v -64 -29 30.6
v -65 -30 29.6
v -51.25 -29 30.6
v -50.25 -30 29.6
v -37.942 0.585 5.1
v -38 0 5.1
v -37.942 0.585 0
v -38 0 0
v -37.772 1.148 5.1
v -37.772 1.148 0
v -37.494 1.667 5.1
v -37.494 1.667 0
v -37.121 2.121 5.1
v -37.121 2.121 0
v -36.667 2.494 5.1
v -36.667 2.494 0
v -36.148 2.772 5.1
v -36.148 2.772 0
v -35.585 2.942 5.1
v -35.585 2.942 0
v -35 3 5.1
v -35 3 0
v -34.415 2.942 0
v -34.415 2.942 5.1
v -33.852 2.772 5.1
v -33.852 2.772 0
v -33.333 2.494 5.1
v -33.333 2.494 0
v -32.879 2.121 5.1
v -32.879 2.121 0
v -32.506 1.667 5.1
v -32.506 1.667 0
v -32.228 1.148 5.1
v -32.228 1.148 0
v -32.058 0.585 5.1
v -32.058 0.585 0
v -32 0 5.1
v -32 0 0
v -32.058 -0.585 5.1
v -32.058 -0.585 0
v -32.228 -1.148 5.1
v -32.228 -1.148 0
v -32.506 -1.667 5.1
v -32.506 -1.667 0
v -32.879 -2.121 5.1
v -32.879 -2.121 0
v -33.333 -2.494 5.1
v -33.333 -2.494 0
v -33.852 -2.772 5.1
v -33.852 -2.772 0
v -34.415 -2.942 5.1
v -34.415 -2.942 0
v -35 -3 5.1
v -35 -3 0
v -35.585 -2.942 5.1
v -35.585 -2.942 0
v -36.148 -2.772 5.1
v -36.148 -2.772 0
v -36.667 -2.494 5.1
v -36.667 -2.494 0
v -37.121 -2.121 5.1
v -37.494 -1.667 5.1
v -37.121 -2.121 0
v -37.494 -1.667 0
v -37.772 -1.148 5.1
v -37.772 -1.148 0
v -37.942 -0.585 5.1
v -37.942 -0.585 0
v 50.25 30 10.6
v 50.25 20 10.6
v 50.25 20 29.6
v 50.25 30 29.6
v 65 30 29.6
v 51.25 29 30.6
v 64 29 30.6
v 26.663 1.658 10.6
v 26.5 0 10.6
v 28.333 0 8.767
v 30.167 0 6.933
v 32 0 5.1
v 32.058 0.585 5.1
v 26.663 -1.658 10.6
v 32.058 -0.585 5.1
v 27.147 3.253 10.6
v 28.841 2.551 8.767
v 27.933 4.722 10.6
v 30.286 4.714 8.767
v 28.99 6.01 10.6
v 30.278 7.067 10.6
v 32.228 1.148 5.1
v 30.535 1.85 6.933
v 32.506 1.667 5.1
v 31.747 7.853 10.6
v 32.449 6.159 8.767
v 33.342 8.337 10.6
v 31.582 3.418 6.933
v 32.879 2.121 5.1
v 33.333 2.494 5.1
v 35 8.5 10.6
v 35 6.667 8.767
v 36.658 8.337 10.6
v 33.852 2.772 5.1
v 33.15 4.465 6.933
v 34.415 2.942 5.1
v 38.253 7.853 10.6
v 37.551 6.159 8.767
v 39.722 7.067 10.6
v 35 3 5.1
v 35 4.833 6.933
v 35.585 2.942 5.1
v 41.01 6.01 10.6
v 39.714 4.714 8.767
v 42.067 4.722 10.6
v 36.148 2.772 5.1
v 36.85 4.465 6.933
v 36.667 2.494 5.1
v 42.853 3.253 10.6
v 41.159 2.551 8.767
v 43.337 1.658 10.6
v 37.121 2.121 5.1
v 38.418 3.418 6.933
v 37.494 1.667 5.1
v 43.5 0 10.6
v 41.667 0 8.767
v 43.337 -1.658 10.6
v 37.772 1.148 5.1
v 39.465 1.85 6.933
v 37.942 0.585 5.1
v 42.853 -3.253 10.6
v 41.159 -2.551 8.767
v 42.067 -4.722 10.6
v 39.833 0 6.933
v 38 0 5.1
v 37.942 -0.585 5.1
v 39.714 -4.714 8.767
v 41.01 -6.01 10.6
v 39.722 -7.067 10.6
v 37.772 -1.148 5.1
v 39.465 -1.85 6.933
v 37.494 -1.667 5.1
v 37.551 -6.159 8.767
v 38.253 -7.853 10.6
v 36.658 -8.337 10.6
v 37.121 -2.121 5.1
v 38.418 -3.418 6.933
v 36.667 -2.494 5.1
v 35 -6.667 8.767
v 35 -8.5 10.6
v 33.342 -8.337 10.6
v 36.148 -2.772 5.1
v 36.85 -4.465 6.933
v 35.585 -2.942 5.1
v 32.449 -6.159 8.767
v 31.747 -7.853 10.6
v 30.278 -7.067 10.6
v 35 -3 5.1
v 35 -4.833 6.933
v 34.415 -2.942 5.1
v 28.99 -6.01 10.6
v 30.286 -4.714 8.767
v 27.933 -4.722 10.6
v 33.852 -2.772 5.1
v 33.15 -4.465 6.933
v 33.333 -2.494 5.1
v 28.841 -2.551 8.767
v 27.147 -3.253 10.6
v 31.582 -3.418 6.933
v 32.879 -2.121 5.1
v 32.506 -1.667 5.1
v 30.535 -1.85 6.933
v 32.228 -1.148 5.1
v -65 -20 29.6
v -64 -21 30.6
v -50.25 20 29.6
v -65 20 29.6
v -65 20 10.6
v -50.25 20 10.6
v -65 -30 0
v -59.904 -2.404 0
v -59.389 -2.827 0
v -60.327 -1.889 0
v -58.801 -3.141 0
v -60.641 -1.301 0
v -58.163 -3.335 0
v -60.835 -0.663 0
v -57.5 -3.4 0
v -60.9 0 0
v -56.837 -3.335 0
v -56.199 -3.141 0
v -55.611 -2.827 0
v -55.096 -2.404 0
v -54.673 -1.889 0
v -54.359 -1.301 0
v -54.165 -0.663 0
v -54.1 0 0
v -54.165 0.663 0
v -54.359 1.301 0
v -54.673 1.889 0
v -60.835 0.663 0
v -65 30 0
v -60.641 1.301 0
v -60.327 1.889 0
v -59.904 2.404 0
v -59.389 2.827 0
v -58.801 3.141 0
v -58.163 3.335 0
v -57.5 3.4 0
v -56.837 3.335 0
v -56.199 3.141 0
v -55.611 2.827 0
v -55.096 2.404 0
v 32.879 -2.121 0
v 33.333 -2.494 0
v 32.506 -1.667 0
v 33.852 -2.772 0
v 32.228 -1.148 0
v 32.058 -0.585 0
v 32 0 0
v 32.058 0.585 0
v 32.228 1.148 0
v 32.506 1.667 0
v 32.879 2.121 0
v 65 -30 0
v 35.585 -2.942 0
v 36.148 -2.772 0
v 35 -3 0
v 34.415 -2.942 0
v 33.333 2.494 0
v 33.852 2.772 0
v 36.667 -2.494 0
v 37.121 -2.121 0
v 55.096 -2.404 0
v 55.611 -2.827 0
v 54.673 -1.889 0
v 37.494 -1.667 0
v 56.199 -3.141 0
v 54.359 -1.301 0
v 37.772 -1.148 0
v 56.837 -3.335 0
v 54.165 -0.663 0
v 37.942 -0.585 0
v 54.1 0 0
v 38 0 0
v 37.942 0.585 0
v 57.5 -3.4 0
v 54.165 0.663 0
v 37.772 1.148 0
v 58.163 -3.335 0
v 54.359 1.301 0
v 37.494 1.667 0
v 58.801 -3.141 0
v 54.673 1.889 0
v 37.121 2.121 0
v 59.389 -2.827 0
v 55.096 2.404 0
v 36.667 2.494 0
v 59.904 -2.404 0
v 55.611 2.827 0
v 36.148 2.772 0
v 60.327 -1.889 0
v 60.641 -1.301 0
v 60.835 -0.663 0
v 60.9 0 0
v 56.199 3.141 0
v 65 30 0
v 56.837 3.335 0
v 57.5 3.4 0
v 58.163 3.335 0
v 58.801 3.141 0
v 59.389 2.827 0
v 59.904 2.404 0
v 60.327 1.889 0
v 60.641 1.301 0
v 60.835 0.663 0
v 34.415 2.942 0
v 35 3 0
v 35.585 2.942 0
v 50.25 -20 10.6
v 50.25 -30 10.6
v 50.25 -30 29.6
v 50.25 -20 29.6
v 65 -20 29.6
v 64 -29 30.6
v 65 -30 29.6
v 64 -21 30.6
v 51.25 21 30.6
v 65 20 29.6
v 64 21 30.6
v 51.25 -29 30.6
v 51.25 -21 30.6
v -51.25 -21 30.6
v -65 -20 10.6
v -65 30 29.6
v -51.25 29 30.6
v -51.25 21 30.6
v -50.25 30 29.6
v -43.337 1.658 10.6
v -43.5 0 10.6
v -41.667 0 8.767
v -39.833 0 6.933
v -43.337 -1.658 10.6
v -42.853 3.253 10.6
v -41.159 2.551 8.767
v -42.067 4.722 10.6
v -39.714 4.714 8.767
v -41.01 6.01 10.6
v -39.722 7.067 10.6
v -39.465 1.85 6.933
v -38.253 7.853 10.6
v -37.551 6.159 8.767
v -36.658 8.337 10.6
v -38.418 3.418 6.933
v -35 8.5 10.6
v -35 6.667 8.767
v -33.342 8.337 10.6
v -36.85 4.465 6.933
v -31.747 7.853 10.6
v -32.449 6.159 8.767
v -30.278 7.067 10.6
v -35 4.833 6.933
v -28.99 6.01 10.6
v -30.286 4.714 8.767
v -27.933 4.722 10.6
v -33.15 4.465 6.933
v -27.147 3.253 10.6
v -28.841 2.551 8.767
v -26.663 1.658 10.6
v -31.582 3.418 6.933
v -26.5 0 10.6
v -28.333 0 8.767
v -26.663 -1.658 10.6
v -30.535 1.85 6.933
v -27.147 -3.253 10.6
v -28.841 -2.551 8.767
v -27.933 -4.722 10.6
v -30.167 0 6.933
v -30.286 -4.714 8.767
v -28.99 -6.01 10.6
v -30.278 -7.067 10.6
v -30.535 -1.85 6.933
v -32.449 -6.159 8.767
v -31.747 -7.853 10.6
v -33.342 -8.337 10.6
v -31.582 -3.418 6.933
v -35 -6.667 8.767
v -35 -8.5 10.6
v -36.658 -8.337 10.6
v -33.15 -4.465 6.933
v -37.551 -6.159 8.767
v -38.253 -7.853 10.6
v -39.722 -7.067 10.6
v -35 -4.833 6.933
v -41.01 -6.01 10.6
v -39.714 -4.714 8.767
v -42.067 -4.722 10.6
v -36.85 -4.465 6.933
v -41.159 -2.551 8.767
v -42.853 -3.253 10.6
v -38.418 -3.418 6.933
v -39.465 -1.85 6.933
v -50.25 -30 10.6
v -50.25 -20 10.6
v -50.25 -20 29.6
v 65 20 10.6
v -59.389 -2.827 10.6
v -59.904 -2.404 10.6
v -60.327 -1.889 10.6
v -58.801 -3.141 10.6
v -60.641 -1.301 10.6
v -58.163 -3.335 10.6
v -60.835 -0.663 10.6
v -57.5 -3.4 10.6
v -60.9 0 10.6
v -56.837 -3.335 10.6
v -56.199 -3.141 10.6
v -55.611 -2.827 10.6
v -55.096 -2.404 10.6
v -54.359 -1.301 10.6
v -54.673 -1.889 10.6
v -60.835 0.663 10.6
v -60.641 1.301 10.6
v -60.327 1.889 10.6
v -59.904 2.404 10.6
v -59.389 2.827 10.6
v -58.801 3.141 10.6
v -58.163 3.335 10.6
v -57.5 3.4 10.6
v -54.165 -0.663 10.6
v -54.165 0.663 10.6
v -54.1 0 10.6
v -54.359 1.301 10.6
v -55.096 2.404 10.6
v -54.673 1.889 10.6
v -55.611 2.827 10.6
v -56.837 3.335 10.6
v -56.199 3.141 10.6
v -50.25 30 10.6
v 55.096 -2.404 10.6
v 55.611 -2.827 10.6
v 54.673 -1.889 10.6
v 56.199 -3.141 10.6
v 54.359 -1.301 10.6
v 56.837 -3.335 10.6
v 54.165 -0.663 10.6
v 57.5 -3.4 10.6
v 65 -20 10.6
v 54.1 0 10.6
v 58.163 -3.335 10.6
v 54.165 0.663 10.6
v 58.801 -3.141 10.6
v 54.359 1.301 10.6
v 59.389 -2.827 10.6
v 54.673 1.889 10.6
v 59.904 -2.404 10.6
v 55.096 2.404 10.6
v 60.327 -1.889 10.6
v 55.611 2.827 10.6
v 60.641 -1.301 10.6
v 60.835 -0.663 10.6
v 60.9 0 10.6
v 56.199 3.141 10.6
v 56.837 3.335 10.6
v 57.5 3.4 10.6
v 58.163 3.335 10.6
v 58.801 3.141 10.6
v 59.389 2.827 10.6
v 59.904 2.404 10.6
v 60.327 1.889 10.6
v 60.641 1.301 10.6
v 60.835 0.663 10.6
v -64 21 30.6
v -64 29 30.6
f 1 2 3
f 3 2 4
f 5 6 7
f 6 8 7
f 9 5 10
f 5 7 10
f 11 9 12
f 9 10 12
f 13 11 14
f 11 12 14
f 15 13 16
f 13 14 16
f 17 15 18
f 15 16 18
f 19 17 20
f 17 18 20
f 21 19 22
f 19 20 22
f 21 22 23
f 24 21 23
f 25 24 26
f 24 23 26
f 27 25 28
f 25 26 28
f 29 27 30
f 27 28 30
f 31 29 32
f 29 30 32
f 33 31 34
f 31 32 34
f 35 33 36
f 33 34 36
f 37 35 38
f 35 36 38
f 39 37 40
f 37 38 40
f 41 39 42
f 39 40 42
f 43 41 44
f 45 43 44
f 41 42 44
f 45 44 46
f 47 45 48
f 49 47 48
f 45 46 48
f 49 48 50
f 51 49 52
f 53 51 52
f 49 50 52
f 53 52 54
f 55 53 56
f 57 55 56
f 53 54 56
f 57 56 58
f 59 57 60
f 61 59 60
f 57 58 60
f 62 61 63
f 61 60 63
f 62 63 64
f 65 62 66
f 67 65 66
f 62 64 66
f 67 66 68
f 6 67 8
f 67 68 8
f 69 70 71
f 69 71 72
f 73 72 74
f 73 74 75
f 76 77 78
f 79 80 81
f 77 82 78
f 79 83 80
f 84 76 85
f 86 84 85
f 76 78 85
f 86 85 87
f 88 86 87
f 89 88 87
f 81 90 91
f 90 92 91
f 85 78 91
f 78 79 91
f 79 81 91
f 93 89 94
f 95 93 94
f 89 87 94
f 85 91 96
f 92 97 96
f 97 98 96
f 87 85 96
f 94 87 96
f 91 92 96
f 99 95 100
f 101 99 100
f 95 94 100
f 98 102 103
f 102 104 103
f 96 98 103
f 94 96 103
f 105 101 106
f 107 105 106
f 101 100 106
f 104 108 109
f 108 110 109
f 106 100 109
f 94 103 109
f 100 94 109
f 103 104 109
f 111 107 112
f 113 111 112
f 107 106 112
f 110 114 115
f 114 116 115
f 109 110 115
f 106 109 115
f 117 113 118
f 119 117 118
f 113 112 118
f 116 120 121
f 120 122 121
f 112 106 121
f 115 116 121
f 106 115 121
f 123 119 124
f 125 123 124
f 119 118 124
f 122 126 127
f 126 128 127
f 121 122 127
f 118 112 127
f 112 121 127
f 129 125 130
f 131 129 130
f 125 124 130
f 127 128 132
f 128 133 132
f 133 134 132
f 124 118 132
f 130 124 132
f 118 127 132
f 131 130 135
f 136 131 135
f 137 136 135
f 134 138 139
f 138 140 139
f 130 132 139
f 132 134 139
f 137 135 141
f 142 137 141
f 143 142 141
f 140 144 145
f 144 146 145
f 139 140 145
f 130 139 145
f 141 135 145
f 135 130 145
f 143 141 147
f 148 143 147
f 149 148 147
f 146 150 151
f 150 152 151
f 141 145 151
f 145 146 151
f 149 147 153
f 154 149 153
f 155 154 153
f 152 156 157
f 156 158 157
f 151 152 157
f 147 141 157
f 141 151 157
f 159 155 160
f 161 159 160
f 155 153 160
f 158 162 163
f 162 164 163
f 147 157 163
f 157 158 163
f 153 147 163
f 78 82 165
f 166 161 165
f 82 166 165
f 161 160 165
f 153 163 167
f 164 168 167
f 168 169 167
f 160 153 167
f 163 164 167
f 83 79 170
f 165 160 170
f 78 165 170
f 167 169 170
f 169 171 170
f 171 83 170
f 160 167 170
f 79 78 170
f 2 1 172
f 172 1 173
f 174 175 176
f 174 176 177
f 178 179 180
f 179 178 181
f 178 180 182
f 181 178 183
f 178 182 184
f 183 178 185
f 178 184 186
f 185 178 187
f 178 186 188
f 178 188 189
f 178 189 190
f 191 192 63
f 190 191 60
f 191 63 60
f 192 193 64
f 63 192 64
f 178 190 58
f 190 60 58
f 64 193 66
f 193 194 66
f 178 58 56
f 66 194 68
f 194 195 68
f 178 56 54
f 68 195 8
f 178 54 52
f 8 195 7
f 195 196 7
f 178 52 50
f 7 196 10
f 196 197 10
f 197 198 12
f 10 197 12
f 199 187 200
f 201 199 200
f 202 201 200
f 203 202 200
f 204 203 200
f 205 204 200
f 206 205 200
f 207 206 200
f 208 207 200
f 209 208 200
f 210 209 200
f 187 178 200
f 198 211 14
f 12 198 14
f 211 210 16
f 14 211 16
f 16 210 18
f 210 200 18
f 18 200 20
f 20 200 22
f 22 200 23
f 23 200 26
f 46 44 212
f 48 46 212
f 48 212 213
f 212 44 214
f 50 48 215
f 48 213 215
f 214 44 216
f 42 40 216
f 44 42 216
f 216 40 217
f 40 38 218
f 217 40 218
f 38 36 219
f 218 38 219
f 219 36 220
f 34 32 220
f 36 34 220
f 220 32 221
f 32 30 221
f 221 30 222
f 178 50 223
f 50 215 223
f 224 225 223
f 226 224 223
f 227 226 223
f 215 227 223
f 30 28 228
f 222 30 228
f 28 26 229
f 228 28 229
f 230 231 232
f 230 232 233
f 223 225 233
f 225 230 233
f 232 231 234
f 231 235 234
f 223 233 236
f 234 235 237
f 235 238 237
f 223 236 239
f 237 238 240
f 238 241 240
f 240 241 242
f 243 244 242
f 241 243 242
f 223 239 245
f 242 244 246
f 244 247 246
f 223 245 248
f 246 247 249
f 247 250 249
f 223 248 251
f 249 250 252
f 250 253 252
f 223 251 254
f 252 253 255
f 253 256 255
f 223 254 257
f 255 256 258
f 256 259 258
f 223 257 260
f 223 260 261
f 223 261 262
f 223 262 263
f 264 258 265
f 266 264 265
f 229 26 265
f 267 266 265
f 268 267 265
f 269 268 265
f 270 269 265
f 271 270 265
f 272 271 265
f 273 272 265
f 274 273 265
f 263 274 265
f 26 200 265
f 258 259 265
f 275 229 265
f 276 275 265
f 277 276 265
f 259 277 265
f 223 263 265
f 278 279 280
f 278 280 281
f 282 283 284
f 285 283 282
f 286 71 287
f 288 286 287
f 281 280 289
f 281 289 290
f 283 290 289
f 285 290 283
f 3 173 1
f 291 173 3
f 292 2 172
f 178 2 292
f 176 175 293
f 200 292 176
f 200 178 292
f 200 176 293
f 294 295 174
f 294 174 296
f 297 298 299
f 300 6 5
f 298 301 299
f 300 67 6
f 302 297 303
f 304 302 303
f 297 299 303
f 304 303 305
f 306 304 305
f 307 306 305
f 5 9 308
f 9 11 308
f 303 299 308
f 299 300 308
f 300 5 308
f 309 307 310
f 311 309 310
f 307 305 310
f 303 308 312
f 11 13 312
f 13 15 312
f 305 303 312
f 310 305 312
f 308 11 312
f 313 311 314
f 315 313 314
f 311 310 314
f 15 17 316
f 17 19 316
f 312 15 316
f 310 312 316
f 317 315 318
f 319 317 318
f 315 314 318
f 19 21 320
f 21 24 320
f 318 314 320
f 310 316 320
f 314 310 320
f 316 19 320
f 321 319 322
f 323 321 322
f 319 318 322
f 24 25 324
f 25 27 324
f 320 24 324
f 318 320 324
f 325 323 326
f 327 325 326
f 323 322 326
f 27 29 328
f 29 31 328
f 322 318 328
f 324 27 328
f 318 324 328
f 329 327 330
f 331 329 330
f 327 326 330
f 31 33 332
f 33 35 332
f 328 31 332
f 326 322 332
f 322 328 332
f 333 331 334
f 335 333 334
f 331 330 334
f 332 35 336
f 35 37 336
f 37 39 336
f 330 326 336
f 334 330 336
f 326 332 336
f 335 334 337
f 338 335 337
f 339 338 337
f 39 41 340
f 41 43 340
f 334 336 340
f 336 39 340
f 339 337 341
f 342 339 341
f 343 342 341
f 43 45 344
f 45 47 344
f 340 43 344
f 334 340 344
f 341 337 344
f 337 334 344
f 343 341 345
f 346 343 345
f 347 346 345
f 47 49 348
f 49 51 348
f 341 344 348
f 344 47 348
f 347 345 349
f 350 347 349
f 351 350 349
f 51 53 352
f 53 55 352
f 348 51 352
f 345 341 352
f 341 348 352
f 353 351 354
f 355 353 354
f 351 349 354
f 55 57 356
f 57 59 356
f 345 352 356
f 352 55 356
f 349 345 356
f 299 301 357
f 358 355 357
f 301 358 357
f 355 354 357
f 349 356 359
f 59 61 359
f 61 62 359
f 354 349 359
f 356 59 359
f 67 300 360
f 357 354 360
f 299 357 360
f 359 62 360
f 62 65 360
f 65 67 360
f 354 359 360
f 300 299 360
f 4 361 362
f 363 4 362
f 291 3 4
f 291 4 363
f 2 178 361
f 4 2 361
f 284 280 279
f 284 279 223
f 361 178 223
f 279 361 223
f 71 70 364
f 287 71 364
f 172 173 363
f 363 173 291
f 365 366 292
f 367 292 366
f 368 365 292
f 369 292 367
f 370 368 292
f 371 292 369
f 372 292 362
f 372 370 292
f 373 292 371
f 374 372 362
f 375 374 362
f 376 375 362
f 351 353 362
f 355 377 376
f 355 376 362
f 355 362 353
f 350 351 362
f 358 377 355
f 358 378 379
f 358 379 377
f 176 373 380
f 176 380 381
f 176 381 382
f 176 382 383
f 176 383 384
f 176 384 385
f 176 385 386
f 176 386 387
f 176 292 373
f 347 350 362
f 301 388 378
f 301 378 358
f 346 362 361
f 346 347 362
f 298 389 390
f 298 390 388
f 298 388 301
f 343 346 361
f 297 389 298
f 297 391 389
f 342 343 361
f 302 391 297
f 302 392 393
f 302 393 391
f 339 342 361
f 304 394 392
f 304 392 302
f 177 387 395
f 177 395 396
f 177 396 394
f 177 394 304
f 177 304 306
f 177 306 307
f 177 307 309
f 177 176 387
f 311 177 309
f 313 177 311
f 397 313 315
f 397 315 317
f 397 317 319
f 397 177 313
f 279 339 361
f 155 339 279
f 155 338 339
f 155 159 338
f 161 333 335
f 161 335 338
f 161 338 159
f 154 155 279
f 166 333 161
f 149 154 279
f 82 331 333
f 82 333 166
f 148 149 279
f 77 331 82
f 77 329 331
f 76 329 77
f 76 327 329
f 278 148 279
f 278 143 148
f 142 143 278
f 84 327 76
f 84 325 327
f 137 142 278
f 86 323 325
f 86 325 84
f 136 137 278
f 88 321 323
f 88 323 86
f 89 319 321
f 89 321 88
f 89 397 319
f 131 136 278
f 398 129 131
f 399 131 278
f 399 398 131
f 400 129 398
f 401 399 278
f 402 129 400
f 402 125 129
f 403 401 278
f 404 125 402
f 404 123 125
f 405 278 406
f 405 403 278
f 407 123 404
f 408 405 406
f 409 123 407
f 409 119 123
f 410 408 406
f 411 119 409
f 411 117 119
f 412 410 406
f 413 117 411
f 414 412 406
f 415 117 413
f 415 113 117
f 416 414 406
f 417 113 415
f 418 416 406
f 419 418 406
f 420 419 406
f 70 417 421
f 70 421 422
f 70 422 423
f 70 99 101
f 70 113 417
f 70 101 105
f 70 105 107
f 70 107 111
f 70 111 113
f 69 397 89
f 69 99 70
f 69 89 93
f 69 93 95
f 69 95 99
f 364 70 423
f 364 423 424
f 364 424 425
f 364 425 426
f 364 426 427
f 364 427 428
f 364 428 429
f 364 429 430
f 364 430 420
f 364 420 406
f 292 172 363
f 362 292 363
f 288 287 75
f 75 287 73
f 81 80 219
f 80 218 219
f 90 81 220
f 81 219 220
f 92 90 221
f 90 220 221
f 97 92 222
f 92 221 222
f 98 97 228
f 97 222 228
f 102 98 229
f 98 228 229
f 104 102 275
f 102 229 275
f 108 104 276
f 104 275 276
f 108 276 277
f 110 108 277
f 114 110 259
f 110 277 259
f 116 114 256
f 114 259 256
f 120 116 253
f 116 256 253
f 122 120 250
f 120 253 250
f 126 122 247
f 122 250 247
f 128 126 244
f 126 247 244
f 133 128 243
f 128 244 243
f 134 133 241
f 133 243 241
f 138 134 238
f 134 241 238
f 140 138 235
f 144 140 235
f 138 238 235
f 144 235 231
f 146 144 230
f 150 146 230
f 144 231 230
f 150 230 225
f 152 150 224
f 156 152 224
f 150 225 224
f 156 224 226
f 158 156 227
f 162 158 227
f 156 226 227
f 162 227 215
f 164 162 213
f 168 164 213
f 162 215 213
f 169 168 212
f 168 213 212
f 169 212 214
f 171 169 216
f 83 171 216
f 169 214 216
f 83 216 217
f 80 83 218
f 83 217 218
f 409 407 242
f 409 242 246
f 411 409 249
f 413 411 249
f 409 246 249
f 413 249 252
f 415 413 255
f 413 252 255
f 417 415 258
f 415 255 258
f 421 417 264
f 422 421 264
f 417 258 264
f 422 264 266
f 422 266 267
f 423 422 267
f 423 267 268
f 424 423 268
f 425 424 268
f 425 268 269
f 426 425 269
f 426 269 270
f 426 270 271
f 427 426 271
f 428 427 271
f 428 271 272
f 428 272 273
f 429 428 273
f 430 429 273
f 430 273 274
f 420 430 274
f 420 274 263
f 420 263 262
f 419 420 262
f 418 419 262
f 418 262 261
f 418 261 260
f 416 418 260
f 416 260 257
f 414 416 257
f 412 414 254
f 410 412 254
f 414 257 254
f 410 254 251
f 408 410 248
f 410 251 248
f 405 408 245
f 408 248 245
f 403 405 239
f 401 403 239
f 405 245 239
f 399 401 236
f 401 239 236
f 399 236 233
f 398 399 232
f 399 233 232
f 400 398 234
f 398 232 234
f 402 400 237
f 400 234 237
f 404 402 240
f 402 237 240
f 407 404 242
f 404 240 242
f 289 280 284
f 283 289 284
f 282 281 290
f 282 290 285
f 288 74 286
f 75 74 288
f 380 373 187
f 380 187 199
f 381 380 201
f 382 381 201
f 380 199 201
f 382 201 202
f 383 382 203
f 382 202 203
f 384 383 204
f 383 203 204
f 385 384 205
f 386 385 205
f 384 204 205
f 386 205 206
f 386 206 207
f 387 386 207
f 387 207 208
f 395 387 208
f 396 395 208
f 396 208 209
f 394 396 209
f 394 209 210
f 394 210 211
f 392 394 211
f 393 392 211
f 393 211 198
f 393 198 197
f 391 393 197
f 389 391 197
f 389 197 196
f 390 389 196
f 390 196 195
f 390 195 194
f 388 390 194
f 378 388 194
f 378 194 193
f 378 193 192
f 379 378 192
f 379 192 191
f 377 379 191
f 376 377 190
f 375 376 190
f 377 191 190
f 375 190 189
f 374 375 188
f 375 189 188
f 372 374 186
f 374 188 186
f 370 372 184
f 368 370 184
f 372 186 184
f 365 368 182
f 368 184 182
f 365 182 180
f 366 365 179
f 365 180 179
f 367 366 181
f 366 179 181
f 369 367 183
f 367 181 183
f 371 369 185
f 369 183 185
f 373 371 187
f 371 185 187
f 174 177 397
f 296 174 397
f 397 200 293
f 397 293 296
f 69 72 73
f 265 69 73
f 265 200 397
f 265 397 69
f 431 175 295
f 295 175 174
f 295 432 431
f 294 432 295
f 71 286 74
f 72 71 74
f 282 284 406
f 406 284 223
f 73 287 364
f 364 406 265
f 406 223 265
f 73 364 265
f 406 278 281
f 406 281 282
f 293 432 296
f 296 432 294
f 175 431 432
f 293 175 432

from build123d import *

# Parameters (mm, degrees)
F0_W           = 130
F0_H           = 60
F1_DEPTH       = 10.6
F2_W           = 14.75
F2_H           = 10
F3_DEPTH       = 20
F5_D           = 6.8
F7_D           = 6
F7_CSINK_D     = 17
F7_CSINK_ANGLE = 90
F8_SIZE        = 1


with BuildPart() as f1:
    # F0 (on Top) → F1 (new body)
    with BuildSketch(Plane.XY):
        Rectangle(F0_W, F0_H)
    extrude(amount=F1_DEPTH)

    # F2 (on face) → F3 (join)
    with BuildSketch(Plane.XY.offset(10.6)):
        with Locations((-57.625, 25)):
            Rectangle(F2_W, F2_H)
        with Locations((-57.625, -25)):
            Rectangle(F2_W, F2_H)
        with Locations((57.625, -25)):
            Rectangle(F2_W, F2_H)
        with Locations((57.625, 25)):
            Rectangle(F2_W, F2_H)
    extrude(amount=F3_DEPTH)

    # F5 (through all)
    with Locations(Plane.XY.offset(10.6)):
        with Locations((57.5, 0), (-57.5, 0)):
            Hole(F5_D / 2)

    # F7 (through all)
    with Locations(Plane.XY.offset(10.6)):
        with Locations((35, 0), (-35, 0)):
            CounterSinkHole(F7_D / 2, F7_CSINK_D / 2, counter_sink_angle=F7_CSINK_ANGLE)

    # F8
    f8_edges = [f1.edges().sort_by_distance(p)[0] for p in [
        (-57.625, -30, 30.6),
        (-50.25, -25, 30.6),
        (-57.625, -20, 30.6),
        (-65, -25, 30.6),
        (-57.625, 20, 30.6),
        (-57.625, 30, 30.6),
        (-50.25, 25, 30.6),
        (-65, 25, 30.6),
        (50.25, -25, 30.6),
        (57.625, -20, 30.6),
        (65, -25, 30.6),
        (57.625, -30, 30.6),
        (65, 25, 30.6),
        (57.625, 20, 30.6),
        (50.25, 25, 30.6),
        (57.625, 30, 30.6),
    ]]
    chamfer(f8_edges, length=F8_SIZE)


solid = f1.part
